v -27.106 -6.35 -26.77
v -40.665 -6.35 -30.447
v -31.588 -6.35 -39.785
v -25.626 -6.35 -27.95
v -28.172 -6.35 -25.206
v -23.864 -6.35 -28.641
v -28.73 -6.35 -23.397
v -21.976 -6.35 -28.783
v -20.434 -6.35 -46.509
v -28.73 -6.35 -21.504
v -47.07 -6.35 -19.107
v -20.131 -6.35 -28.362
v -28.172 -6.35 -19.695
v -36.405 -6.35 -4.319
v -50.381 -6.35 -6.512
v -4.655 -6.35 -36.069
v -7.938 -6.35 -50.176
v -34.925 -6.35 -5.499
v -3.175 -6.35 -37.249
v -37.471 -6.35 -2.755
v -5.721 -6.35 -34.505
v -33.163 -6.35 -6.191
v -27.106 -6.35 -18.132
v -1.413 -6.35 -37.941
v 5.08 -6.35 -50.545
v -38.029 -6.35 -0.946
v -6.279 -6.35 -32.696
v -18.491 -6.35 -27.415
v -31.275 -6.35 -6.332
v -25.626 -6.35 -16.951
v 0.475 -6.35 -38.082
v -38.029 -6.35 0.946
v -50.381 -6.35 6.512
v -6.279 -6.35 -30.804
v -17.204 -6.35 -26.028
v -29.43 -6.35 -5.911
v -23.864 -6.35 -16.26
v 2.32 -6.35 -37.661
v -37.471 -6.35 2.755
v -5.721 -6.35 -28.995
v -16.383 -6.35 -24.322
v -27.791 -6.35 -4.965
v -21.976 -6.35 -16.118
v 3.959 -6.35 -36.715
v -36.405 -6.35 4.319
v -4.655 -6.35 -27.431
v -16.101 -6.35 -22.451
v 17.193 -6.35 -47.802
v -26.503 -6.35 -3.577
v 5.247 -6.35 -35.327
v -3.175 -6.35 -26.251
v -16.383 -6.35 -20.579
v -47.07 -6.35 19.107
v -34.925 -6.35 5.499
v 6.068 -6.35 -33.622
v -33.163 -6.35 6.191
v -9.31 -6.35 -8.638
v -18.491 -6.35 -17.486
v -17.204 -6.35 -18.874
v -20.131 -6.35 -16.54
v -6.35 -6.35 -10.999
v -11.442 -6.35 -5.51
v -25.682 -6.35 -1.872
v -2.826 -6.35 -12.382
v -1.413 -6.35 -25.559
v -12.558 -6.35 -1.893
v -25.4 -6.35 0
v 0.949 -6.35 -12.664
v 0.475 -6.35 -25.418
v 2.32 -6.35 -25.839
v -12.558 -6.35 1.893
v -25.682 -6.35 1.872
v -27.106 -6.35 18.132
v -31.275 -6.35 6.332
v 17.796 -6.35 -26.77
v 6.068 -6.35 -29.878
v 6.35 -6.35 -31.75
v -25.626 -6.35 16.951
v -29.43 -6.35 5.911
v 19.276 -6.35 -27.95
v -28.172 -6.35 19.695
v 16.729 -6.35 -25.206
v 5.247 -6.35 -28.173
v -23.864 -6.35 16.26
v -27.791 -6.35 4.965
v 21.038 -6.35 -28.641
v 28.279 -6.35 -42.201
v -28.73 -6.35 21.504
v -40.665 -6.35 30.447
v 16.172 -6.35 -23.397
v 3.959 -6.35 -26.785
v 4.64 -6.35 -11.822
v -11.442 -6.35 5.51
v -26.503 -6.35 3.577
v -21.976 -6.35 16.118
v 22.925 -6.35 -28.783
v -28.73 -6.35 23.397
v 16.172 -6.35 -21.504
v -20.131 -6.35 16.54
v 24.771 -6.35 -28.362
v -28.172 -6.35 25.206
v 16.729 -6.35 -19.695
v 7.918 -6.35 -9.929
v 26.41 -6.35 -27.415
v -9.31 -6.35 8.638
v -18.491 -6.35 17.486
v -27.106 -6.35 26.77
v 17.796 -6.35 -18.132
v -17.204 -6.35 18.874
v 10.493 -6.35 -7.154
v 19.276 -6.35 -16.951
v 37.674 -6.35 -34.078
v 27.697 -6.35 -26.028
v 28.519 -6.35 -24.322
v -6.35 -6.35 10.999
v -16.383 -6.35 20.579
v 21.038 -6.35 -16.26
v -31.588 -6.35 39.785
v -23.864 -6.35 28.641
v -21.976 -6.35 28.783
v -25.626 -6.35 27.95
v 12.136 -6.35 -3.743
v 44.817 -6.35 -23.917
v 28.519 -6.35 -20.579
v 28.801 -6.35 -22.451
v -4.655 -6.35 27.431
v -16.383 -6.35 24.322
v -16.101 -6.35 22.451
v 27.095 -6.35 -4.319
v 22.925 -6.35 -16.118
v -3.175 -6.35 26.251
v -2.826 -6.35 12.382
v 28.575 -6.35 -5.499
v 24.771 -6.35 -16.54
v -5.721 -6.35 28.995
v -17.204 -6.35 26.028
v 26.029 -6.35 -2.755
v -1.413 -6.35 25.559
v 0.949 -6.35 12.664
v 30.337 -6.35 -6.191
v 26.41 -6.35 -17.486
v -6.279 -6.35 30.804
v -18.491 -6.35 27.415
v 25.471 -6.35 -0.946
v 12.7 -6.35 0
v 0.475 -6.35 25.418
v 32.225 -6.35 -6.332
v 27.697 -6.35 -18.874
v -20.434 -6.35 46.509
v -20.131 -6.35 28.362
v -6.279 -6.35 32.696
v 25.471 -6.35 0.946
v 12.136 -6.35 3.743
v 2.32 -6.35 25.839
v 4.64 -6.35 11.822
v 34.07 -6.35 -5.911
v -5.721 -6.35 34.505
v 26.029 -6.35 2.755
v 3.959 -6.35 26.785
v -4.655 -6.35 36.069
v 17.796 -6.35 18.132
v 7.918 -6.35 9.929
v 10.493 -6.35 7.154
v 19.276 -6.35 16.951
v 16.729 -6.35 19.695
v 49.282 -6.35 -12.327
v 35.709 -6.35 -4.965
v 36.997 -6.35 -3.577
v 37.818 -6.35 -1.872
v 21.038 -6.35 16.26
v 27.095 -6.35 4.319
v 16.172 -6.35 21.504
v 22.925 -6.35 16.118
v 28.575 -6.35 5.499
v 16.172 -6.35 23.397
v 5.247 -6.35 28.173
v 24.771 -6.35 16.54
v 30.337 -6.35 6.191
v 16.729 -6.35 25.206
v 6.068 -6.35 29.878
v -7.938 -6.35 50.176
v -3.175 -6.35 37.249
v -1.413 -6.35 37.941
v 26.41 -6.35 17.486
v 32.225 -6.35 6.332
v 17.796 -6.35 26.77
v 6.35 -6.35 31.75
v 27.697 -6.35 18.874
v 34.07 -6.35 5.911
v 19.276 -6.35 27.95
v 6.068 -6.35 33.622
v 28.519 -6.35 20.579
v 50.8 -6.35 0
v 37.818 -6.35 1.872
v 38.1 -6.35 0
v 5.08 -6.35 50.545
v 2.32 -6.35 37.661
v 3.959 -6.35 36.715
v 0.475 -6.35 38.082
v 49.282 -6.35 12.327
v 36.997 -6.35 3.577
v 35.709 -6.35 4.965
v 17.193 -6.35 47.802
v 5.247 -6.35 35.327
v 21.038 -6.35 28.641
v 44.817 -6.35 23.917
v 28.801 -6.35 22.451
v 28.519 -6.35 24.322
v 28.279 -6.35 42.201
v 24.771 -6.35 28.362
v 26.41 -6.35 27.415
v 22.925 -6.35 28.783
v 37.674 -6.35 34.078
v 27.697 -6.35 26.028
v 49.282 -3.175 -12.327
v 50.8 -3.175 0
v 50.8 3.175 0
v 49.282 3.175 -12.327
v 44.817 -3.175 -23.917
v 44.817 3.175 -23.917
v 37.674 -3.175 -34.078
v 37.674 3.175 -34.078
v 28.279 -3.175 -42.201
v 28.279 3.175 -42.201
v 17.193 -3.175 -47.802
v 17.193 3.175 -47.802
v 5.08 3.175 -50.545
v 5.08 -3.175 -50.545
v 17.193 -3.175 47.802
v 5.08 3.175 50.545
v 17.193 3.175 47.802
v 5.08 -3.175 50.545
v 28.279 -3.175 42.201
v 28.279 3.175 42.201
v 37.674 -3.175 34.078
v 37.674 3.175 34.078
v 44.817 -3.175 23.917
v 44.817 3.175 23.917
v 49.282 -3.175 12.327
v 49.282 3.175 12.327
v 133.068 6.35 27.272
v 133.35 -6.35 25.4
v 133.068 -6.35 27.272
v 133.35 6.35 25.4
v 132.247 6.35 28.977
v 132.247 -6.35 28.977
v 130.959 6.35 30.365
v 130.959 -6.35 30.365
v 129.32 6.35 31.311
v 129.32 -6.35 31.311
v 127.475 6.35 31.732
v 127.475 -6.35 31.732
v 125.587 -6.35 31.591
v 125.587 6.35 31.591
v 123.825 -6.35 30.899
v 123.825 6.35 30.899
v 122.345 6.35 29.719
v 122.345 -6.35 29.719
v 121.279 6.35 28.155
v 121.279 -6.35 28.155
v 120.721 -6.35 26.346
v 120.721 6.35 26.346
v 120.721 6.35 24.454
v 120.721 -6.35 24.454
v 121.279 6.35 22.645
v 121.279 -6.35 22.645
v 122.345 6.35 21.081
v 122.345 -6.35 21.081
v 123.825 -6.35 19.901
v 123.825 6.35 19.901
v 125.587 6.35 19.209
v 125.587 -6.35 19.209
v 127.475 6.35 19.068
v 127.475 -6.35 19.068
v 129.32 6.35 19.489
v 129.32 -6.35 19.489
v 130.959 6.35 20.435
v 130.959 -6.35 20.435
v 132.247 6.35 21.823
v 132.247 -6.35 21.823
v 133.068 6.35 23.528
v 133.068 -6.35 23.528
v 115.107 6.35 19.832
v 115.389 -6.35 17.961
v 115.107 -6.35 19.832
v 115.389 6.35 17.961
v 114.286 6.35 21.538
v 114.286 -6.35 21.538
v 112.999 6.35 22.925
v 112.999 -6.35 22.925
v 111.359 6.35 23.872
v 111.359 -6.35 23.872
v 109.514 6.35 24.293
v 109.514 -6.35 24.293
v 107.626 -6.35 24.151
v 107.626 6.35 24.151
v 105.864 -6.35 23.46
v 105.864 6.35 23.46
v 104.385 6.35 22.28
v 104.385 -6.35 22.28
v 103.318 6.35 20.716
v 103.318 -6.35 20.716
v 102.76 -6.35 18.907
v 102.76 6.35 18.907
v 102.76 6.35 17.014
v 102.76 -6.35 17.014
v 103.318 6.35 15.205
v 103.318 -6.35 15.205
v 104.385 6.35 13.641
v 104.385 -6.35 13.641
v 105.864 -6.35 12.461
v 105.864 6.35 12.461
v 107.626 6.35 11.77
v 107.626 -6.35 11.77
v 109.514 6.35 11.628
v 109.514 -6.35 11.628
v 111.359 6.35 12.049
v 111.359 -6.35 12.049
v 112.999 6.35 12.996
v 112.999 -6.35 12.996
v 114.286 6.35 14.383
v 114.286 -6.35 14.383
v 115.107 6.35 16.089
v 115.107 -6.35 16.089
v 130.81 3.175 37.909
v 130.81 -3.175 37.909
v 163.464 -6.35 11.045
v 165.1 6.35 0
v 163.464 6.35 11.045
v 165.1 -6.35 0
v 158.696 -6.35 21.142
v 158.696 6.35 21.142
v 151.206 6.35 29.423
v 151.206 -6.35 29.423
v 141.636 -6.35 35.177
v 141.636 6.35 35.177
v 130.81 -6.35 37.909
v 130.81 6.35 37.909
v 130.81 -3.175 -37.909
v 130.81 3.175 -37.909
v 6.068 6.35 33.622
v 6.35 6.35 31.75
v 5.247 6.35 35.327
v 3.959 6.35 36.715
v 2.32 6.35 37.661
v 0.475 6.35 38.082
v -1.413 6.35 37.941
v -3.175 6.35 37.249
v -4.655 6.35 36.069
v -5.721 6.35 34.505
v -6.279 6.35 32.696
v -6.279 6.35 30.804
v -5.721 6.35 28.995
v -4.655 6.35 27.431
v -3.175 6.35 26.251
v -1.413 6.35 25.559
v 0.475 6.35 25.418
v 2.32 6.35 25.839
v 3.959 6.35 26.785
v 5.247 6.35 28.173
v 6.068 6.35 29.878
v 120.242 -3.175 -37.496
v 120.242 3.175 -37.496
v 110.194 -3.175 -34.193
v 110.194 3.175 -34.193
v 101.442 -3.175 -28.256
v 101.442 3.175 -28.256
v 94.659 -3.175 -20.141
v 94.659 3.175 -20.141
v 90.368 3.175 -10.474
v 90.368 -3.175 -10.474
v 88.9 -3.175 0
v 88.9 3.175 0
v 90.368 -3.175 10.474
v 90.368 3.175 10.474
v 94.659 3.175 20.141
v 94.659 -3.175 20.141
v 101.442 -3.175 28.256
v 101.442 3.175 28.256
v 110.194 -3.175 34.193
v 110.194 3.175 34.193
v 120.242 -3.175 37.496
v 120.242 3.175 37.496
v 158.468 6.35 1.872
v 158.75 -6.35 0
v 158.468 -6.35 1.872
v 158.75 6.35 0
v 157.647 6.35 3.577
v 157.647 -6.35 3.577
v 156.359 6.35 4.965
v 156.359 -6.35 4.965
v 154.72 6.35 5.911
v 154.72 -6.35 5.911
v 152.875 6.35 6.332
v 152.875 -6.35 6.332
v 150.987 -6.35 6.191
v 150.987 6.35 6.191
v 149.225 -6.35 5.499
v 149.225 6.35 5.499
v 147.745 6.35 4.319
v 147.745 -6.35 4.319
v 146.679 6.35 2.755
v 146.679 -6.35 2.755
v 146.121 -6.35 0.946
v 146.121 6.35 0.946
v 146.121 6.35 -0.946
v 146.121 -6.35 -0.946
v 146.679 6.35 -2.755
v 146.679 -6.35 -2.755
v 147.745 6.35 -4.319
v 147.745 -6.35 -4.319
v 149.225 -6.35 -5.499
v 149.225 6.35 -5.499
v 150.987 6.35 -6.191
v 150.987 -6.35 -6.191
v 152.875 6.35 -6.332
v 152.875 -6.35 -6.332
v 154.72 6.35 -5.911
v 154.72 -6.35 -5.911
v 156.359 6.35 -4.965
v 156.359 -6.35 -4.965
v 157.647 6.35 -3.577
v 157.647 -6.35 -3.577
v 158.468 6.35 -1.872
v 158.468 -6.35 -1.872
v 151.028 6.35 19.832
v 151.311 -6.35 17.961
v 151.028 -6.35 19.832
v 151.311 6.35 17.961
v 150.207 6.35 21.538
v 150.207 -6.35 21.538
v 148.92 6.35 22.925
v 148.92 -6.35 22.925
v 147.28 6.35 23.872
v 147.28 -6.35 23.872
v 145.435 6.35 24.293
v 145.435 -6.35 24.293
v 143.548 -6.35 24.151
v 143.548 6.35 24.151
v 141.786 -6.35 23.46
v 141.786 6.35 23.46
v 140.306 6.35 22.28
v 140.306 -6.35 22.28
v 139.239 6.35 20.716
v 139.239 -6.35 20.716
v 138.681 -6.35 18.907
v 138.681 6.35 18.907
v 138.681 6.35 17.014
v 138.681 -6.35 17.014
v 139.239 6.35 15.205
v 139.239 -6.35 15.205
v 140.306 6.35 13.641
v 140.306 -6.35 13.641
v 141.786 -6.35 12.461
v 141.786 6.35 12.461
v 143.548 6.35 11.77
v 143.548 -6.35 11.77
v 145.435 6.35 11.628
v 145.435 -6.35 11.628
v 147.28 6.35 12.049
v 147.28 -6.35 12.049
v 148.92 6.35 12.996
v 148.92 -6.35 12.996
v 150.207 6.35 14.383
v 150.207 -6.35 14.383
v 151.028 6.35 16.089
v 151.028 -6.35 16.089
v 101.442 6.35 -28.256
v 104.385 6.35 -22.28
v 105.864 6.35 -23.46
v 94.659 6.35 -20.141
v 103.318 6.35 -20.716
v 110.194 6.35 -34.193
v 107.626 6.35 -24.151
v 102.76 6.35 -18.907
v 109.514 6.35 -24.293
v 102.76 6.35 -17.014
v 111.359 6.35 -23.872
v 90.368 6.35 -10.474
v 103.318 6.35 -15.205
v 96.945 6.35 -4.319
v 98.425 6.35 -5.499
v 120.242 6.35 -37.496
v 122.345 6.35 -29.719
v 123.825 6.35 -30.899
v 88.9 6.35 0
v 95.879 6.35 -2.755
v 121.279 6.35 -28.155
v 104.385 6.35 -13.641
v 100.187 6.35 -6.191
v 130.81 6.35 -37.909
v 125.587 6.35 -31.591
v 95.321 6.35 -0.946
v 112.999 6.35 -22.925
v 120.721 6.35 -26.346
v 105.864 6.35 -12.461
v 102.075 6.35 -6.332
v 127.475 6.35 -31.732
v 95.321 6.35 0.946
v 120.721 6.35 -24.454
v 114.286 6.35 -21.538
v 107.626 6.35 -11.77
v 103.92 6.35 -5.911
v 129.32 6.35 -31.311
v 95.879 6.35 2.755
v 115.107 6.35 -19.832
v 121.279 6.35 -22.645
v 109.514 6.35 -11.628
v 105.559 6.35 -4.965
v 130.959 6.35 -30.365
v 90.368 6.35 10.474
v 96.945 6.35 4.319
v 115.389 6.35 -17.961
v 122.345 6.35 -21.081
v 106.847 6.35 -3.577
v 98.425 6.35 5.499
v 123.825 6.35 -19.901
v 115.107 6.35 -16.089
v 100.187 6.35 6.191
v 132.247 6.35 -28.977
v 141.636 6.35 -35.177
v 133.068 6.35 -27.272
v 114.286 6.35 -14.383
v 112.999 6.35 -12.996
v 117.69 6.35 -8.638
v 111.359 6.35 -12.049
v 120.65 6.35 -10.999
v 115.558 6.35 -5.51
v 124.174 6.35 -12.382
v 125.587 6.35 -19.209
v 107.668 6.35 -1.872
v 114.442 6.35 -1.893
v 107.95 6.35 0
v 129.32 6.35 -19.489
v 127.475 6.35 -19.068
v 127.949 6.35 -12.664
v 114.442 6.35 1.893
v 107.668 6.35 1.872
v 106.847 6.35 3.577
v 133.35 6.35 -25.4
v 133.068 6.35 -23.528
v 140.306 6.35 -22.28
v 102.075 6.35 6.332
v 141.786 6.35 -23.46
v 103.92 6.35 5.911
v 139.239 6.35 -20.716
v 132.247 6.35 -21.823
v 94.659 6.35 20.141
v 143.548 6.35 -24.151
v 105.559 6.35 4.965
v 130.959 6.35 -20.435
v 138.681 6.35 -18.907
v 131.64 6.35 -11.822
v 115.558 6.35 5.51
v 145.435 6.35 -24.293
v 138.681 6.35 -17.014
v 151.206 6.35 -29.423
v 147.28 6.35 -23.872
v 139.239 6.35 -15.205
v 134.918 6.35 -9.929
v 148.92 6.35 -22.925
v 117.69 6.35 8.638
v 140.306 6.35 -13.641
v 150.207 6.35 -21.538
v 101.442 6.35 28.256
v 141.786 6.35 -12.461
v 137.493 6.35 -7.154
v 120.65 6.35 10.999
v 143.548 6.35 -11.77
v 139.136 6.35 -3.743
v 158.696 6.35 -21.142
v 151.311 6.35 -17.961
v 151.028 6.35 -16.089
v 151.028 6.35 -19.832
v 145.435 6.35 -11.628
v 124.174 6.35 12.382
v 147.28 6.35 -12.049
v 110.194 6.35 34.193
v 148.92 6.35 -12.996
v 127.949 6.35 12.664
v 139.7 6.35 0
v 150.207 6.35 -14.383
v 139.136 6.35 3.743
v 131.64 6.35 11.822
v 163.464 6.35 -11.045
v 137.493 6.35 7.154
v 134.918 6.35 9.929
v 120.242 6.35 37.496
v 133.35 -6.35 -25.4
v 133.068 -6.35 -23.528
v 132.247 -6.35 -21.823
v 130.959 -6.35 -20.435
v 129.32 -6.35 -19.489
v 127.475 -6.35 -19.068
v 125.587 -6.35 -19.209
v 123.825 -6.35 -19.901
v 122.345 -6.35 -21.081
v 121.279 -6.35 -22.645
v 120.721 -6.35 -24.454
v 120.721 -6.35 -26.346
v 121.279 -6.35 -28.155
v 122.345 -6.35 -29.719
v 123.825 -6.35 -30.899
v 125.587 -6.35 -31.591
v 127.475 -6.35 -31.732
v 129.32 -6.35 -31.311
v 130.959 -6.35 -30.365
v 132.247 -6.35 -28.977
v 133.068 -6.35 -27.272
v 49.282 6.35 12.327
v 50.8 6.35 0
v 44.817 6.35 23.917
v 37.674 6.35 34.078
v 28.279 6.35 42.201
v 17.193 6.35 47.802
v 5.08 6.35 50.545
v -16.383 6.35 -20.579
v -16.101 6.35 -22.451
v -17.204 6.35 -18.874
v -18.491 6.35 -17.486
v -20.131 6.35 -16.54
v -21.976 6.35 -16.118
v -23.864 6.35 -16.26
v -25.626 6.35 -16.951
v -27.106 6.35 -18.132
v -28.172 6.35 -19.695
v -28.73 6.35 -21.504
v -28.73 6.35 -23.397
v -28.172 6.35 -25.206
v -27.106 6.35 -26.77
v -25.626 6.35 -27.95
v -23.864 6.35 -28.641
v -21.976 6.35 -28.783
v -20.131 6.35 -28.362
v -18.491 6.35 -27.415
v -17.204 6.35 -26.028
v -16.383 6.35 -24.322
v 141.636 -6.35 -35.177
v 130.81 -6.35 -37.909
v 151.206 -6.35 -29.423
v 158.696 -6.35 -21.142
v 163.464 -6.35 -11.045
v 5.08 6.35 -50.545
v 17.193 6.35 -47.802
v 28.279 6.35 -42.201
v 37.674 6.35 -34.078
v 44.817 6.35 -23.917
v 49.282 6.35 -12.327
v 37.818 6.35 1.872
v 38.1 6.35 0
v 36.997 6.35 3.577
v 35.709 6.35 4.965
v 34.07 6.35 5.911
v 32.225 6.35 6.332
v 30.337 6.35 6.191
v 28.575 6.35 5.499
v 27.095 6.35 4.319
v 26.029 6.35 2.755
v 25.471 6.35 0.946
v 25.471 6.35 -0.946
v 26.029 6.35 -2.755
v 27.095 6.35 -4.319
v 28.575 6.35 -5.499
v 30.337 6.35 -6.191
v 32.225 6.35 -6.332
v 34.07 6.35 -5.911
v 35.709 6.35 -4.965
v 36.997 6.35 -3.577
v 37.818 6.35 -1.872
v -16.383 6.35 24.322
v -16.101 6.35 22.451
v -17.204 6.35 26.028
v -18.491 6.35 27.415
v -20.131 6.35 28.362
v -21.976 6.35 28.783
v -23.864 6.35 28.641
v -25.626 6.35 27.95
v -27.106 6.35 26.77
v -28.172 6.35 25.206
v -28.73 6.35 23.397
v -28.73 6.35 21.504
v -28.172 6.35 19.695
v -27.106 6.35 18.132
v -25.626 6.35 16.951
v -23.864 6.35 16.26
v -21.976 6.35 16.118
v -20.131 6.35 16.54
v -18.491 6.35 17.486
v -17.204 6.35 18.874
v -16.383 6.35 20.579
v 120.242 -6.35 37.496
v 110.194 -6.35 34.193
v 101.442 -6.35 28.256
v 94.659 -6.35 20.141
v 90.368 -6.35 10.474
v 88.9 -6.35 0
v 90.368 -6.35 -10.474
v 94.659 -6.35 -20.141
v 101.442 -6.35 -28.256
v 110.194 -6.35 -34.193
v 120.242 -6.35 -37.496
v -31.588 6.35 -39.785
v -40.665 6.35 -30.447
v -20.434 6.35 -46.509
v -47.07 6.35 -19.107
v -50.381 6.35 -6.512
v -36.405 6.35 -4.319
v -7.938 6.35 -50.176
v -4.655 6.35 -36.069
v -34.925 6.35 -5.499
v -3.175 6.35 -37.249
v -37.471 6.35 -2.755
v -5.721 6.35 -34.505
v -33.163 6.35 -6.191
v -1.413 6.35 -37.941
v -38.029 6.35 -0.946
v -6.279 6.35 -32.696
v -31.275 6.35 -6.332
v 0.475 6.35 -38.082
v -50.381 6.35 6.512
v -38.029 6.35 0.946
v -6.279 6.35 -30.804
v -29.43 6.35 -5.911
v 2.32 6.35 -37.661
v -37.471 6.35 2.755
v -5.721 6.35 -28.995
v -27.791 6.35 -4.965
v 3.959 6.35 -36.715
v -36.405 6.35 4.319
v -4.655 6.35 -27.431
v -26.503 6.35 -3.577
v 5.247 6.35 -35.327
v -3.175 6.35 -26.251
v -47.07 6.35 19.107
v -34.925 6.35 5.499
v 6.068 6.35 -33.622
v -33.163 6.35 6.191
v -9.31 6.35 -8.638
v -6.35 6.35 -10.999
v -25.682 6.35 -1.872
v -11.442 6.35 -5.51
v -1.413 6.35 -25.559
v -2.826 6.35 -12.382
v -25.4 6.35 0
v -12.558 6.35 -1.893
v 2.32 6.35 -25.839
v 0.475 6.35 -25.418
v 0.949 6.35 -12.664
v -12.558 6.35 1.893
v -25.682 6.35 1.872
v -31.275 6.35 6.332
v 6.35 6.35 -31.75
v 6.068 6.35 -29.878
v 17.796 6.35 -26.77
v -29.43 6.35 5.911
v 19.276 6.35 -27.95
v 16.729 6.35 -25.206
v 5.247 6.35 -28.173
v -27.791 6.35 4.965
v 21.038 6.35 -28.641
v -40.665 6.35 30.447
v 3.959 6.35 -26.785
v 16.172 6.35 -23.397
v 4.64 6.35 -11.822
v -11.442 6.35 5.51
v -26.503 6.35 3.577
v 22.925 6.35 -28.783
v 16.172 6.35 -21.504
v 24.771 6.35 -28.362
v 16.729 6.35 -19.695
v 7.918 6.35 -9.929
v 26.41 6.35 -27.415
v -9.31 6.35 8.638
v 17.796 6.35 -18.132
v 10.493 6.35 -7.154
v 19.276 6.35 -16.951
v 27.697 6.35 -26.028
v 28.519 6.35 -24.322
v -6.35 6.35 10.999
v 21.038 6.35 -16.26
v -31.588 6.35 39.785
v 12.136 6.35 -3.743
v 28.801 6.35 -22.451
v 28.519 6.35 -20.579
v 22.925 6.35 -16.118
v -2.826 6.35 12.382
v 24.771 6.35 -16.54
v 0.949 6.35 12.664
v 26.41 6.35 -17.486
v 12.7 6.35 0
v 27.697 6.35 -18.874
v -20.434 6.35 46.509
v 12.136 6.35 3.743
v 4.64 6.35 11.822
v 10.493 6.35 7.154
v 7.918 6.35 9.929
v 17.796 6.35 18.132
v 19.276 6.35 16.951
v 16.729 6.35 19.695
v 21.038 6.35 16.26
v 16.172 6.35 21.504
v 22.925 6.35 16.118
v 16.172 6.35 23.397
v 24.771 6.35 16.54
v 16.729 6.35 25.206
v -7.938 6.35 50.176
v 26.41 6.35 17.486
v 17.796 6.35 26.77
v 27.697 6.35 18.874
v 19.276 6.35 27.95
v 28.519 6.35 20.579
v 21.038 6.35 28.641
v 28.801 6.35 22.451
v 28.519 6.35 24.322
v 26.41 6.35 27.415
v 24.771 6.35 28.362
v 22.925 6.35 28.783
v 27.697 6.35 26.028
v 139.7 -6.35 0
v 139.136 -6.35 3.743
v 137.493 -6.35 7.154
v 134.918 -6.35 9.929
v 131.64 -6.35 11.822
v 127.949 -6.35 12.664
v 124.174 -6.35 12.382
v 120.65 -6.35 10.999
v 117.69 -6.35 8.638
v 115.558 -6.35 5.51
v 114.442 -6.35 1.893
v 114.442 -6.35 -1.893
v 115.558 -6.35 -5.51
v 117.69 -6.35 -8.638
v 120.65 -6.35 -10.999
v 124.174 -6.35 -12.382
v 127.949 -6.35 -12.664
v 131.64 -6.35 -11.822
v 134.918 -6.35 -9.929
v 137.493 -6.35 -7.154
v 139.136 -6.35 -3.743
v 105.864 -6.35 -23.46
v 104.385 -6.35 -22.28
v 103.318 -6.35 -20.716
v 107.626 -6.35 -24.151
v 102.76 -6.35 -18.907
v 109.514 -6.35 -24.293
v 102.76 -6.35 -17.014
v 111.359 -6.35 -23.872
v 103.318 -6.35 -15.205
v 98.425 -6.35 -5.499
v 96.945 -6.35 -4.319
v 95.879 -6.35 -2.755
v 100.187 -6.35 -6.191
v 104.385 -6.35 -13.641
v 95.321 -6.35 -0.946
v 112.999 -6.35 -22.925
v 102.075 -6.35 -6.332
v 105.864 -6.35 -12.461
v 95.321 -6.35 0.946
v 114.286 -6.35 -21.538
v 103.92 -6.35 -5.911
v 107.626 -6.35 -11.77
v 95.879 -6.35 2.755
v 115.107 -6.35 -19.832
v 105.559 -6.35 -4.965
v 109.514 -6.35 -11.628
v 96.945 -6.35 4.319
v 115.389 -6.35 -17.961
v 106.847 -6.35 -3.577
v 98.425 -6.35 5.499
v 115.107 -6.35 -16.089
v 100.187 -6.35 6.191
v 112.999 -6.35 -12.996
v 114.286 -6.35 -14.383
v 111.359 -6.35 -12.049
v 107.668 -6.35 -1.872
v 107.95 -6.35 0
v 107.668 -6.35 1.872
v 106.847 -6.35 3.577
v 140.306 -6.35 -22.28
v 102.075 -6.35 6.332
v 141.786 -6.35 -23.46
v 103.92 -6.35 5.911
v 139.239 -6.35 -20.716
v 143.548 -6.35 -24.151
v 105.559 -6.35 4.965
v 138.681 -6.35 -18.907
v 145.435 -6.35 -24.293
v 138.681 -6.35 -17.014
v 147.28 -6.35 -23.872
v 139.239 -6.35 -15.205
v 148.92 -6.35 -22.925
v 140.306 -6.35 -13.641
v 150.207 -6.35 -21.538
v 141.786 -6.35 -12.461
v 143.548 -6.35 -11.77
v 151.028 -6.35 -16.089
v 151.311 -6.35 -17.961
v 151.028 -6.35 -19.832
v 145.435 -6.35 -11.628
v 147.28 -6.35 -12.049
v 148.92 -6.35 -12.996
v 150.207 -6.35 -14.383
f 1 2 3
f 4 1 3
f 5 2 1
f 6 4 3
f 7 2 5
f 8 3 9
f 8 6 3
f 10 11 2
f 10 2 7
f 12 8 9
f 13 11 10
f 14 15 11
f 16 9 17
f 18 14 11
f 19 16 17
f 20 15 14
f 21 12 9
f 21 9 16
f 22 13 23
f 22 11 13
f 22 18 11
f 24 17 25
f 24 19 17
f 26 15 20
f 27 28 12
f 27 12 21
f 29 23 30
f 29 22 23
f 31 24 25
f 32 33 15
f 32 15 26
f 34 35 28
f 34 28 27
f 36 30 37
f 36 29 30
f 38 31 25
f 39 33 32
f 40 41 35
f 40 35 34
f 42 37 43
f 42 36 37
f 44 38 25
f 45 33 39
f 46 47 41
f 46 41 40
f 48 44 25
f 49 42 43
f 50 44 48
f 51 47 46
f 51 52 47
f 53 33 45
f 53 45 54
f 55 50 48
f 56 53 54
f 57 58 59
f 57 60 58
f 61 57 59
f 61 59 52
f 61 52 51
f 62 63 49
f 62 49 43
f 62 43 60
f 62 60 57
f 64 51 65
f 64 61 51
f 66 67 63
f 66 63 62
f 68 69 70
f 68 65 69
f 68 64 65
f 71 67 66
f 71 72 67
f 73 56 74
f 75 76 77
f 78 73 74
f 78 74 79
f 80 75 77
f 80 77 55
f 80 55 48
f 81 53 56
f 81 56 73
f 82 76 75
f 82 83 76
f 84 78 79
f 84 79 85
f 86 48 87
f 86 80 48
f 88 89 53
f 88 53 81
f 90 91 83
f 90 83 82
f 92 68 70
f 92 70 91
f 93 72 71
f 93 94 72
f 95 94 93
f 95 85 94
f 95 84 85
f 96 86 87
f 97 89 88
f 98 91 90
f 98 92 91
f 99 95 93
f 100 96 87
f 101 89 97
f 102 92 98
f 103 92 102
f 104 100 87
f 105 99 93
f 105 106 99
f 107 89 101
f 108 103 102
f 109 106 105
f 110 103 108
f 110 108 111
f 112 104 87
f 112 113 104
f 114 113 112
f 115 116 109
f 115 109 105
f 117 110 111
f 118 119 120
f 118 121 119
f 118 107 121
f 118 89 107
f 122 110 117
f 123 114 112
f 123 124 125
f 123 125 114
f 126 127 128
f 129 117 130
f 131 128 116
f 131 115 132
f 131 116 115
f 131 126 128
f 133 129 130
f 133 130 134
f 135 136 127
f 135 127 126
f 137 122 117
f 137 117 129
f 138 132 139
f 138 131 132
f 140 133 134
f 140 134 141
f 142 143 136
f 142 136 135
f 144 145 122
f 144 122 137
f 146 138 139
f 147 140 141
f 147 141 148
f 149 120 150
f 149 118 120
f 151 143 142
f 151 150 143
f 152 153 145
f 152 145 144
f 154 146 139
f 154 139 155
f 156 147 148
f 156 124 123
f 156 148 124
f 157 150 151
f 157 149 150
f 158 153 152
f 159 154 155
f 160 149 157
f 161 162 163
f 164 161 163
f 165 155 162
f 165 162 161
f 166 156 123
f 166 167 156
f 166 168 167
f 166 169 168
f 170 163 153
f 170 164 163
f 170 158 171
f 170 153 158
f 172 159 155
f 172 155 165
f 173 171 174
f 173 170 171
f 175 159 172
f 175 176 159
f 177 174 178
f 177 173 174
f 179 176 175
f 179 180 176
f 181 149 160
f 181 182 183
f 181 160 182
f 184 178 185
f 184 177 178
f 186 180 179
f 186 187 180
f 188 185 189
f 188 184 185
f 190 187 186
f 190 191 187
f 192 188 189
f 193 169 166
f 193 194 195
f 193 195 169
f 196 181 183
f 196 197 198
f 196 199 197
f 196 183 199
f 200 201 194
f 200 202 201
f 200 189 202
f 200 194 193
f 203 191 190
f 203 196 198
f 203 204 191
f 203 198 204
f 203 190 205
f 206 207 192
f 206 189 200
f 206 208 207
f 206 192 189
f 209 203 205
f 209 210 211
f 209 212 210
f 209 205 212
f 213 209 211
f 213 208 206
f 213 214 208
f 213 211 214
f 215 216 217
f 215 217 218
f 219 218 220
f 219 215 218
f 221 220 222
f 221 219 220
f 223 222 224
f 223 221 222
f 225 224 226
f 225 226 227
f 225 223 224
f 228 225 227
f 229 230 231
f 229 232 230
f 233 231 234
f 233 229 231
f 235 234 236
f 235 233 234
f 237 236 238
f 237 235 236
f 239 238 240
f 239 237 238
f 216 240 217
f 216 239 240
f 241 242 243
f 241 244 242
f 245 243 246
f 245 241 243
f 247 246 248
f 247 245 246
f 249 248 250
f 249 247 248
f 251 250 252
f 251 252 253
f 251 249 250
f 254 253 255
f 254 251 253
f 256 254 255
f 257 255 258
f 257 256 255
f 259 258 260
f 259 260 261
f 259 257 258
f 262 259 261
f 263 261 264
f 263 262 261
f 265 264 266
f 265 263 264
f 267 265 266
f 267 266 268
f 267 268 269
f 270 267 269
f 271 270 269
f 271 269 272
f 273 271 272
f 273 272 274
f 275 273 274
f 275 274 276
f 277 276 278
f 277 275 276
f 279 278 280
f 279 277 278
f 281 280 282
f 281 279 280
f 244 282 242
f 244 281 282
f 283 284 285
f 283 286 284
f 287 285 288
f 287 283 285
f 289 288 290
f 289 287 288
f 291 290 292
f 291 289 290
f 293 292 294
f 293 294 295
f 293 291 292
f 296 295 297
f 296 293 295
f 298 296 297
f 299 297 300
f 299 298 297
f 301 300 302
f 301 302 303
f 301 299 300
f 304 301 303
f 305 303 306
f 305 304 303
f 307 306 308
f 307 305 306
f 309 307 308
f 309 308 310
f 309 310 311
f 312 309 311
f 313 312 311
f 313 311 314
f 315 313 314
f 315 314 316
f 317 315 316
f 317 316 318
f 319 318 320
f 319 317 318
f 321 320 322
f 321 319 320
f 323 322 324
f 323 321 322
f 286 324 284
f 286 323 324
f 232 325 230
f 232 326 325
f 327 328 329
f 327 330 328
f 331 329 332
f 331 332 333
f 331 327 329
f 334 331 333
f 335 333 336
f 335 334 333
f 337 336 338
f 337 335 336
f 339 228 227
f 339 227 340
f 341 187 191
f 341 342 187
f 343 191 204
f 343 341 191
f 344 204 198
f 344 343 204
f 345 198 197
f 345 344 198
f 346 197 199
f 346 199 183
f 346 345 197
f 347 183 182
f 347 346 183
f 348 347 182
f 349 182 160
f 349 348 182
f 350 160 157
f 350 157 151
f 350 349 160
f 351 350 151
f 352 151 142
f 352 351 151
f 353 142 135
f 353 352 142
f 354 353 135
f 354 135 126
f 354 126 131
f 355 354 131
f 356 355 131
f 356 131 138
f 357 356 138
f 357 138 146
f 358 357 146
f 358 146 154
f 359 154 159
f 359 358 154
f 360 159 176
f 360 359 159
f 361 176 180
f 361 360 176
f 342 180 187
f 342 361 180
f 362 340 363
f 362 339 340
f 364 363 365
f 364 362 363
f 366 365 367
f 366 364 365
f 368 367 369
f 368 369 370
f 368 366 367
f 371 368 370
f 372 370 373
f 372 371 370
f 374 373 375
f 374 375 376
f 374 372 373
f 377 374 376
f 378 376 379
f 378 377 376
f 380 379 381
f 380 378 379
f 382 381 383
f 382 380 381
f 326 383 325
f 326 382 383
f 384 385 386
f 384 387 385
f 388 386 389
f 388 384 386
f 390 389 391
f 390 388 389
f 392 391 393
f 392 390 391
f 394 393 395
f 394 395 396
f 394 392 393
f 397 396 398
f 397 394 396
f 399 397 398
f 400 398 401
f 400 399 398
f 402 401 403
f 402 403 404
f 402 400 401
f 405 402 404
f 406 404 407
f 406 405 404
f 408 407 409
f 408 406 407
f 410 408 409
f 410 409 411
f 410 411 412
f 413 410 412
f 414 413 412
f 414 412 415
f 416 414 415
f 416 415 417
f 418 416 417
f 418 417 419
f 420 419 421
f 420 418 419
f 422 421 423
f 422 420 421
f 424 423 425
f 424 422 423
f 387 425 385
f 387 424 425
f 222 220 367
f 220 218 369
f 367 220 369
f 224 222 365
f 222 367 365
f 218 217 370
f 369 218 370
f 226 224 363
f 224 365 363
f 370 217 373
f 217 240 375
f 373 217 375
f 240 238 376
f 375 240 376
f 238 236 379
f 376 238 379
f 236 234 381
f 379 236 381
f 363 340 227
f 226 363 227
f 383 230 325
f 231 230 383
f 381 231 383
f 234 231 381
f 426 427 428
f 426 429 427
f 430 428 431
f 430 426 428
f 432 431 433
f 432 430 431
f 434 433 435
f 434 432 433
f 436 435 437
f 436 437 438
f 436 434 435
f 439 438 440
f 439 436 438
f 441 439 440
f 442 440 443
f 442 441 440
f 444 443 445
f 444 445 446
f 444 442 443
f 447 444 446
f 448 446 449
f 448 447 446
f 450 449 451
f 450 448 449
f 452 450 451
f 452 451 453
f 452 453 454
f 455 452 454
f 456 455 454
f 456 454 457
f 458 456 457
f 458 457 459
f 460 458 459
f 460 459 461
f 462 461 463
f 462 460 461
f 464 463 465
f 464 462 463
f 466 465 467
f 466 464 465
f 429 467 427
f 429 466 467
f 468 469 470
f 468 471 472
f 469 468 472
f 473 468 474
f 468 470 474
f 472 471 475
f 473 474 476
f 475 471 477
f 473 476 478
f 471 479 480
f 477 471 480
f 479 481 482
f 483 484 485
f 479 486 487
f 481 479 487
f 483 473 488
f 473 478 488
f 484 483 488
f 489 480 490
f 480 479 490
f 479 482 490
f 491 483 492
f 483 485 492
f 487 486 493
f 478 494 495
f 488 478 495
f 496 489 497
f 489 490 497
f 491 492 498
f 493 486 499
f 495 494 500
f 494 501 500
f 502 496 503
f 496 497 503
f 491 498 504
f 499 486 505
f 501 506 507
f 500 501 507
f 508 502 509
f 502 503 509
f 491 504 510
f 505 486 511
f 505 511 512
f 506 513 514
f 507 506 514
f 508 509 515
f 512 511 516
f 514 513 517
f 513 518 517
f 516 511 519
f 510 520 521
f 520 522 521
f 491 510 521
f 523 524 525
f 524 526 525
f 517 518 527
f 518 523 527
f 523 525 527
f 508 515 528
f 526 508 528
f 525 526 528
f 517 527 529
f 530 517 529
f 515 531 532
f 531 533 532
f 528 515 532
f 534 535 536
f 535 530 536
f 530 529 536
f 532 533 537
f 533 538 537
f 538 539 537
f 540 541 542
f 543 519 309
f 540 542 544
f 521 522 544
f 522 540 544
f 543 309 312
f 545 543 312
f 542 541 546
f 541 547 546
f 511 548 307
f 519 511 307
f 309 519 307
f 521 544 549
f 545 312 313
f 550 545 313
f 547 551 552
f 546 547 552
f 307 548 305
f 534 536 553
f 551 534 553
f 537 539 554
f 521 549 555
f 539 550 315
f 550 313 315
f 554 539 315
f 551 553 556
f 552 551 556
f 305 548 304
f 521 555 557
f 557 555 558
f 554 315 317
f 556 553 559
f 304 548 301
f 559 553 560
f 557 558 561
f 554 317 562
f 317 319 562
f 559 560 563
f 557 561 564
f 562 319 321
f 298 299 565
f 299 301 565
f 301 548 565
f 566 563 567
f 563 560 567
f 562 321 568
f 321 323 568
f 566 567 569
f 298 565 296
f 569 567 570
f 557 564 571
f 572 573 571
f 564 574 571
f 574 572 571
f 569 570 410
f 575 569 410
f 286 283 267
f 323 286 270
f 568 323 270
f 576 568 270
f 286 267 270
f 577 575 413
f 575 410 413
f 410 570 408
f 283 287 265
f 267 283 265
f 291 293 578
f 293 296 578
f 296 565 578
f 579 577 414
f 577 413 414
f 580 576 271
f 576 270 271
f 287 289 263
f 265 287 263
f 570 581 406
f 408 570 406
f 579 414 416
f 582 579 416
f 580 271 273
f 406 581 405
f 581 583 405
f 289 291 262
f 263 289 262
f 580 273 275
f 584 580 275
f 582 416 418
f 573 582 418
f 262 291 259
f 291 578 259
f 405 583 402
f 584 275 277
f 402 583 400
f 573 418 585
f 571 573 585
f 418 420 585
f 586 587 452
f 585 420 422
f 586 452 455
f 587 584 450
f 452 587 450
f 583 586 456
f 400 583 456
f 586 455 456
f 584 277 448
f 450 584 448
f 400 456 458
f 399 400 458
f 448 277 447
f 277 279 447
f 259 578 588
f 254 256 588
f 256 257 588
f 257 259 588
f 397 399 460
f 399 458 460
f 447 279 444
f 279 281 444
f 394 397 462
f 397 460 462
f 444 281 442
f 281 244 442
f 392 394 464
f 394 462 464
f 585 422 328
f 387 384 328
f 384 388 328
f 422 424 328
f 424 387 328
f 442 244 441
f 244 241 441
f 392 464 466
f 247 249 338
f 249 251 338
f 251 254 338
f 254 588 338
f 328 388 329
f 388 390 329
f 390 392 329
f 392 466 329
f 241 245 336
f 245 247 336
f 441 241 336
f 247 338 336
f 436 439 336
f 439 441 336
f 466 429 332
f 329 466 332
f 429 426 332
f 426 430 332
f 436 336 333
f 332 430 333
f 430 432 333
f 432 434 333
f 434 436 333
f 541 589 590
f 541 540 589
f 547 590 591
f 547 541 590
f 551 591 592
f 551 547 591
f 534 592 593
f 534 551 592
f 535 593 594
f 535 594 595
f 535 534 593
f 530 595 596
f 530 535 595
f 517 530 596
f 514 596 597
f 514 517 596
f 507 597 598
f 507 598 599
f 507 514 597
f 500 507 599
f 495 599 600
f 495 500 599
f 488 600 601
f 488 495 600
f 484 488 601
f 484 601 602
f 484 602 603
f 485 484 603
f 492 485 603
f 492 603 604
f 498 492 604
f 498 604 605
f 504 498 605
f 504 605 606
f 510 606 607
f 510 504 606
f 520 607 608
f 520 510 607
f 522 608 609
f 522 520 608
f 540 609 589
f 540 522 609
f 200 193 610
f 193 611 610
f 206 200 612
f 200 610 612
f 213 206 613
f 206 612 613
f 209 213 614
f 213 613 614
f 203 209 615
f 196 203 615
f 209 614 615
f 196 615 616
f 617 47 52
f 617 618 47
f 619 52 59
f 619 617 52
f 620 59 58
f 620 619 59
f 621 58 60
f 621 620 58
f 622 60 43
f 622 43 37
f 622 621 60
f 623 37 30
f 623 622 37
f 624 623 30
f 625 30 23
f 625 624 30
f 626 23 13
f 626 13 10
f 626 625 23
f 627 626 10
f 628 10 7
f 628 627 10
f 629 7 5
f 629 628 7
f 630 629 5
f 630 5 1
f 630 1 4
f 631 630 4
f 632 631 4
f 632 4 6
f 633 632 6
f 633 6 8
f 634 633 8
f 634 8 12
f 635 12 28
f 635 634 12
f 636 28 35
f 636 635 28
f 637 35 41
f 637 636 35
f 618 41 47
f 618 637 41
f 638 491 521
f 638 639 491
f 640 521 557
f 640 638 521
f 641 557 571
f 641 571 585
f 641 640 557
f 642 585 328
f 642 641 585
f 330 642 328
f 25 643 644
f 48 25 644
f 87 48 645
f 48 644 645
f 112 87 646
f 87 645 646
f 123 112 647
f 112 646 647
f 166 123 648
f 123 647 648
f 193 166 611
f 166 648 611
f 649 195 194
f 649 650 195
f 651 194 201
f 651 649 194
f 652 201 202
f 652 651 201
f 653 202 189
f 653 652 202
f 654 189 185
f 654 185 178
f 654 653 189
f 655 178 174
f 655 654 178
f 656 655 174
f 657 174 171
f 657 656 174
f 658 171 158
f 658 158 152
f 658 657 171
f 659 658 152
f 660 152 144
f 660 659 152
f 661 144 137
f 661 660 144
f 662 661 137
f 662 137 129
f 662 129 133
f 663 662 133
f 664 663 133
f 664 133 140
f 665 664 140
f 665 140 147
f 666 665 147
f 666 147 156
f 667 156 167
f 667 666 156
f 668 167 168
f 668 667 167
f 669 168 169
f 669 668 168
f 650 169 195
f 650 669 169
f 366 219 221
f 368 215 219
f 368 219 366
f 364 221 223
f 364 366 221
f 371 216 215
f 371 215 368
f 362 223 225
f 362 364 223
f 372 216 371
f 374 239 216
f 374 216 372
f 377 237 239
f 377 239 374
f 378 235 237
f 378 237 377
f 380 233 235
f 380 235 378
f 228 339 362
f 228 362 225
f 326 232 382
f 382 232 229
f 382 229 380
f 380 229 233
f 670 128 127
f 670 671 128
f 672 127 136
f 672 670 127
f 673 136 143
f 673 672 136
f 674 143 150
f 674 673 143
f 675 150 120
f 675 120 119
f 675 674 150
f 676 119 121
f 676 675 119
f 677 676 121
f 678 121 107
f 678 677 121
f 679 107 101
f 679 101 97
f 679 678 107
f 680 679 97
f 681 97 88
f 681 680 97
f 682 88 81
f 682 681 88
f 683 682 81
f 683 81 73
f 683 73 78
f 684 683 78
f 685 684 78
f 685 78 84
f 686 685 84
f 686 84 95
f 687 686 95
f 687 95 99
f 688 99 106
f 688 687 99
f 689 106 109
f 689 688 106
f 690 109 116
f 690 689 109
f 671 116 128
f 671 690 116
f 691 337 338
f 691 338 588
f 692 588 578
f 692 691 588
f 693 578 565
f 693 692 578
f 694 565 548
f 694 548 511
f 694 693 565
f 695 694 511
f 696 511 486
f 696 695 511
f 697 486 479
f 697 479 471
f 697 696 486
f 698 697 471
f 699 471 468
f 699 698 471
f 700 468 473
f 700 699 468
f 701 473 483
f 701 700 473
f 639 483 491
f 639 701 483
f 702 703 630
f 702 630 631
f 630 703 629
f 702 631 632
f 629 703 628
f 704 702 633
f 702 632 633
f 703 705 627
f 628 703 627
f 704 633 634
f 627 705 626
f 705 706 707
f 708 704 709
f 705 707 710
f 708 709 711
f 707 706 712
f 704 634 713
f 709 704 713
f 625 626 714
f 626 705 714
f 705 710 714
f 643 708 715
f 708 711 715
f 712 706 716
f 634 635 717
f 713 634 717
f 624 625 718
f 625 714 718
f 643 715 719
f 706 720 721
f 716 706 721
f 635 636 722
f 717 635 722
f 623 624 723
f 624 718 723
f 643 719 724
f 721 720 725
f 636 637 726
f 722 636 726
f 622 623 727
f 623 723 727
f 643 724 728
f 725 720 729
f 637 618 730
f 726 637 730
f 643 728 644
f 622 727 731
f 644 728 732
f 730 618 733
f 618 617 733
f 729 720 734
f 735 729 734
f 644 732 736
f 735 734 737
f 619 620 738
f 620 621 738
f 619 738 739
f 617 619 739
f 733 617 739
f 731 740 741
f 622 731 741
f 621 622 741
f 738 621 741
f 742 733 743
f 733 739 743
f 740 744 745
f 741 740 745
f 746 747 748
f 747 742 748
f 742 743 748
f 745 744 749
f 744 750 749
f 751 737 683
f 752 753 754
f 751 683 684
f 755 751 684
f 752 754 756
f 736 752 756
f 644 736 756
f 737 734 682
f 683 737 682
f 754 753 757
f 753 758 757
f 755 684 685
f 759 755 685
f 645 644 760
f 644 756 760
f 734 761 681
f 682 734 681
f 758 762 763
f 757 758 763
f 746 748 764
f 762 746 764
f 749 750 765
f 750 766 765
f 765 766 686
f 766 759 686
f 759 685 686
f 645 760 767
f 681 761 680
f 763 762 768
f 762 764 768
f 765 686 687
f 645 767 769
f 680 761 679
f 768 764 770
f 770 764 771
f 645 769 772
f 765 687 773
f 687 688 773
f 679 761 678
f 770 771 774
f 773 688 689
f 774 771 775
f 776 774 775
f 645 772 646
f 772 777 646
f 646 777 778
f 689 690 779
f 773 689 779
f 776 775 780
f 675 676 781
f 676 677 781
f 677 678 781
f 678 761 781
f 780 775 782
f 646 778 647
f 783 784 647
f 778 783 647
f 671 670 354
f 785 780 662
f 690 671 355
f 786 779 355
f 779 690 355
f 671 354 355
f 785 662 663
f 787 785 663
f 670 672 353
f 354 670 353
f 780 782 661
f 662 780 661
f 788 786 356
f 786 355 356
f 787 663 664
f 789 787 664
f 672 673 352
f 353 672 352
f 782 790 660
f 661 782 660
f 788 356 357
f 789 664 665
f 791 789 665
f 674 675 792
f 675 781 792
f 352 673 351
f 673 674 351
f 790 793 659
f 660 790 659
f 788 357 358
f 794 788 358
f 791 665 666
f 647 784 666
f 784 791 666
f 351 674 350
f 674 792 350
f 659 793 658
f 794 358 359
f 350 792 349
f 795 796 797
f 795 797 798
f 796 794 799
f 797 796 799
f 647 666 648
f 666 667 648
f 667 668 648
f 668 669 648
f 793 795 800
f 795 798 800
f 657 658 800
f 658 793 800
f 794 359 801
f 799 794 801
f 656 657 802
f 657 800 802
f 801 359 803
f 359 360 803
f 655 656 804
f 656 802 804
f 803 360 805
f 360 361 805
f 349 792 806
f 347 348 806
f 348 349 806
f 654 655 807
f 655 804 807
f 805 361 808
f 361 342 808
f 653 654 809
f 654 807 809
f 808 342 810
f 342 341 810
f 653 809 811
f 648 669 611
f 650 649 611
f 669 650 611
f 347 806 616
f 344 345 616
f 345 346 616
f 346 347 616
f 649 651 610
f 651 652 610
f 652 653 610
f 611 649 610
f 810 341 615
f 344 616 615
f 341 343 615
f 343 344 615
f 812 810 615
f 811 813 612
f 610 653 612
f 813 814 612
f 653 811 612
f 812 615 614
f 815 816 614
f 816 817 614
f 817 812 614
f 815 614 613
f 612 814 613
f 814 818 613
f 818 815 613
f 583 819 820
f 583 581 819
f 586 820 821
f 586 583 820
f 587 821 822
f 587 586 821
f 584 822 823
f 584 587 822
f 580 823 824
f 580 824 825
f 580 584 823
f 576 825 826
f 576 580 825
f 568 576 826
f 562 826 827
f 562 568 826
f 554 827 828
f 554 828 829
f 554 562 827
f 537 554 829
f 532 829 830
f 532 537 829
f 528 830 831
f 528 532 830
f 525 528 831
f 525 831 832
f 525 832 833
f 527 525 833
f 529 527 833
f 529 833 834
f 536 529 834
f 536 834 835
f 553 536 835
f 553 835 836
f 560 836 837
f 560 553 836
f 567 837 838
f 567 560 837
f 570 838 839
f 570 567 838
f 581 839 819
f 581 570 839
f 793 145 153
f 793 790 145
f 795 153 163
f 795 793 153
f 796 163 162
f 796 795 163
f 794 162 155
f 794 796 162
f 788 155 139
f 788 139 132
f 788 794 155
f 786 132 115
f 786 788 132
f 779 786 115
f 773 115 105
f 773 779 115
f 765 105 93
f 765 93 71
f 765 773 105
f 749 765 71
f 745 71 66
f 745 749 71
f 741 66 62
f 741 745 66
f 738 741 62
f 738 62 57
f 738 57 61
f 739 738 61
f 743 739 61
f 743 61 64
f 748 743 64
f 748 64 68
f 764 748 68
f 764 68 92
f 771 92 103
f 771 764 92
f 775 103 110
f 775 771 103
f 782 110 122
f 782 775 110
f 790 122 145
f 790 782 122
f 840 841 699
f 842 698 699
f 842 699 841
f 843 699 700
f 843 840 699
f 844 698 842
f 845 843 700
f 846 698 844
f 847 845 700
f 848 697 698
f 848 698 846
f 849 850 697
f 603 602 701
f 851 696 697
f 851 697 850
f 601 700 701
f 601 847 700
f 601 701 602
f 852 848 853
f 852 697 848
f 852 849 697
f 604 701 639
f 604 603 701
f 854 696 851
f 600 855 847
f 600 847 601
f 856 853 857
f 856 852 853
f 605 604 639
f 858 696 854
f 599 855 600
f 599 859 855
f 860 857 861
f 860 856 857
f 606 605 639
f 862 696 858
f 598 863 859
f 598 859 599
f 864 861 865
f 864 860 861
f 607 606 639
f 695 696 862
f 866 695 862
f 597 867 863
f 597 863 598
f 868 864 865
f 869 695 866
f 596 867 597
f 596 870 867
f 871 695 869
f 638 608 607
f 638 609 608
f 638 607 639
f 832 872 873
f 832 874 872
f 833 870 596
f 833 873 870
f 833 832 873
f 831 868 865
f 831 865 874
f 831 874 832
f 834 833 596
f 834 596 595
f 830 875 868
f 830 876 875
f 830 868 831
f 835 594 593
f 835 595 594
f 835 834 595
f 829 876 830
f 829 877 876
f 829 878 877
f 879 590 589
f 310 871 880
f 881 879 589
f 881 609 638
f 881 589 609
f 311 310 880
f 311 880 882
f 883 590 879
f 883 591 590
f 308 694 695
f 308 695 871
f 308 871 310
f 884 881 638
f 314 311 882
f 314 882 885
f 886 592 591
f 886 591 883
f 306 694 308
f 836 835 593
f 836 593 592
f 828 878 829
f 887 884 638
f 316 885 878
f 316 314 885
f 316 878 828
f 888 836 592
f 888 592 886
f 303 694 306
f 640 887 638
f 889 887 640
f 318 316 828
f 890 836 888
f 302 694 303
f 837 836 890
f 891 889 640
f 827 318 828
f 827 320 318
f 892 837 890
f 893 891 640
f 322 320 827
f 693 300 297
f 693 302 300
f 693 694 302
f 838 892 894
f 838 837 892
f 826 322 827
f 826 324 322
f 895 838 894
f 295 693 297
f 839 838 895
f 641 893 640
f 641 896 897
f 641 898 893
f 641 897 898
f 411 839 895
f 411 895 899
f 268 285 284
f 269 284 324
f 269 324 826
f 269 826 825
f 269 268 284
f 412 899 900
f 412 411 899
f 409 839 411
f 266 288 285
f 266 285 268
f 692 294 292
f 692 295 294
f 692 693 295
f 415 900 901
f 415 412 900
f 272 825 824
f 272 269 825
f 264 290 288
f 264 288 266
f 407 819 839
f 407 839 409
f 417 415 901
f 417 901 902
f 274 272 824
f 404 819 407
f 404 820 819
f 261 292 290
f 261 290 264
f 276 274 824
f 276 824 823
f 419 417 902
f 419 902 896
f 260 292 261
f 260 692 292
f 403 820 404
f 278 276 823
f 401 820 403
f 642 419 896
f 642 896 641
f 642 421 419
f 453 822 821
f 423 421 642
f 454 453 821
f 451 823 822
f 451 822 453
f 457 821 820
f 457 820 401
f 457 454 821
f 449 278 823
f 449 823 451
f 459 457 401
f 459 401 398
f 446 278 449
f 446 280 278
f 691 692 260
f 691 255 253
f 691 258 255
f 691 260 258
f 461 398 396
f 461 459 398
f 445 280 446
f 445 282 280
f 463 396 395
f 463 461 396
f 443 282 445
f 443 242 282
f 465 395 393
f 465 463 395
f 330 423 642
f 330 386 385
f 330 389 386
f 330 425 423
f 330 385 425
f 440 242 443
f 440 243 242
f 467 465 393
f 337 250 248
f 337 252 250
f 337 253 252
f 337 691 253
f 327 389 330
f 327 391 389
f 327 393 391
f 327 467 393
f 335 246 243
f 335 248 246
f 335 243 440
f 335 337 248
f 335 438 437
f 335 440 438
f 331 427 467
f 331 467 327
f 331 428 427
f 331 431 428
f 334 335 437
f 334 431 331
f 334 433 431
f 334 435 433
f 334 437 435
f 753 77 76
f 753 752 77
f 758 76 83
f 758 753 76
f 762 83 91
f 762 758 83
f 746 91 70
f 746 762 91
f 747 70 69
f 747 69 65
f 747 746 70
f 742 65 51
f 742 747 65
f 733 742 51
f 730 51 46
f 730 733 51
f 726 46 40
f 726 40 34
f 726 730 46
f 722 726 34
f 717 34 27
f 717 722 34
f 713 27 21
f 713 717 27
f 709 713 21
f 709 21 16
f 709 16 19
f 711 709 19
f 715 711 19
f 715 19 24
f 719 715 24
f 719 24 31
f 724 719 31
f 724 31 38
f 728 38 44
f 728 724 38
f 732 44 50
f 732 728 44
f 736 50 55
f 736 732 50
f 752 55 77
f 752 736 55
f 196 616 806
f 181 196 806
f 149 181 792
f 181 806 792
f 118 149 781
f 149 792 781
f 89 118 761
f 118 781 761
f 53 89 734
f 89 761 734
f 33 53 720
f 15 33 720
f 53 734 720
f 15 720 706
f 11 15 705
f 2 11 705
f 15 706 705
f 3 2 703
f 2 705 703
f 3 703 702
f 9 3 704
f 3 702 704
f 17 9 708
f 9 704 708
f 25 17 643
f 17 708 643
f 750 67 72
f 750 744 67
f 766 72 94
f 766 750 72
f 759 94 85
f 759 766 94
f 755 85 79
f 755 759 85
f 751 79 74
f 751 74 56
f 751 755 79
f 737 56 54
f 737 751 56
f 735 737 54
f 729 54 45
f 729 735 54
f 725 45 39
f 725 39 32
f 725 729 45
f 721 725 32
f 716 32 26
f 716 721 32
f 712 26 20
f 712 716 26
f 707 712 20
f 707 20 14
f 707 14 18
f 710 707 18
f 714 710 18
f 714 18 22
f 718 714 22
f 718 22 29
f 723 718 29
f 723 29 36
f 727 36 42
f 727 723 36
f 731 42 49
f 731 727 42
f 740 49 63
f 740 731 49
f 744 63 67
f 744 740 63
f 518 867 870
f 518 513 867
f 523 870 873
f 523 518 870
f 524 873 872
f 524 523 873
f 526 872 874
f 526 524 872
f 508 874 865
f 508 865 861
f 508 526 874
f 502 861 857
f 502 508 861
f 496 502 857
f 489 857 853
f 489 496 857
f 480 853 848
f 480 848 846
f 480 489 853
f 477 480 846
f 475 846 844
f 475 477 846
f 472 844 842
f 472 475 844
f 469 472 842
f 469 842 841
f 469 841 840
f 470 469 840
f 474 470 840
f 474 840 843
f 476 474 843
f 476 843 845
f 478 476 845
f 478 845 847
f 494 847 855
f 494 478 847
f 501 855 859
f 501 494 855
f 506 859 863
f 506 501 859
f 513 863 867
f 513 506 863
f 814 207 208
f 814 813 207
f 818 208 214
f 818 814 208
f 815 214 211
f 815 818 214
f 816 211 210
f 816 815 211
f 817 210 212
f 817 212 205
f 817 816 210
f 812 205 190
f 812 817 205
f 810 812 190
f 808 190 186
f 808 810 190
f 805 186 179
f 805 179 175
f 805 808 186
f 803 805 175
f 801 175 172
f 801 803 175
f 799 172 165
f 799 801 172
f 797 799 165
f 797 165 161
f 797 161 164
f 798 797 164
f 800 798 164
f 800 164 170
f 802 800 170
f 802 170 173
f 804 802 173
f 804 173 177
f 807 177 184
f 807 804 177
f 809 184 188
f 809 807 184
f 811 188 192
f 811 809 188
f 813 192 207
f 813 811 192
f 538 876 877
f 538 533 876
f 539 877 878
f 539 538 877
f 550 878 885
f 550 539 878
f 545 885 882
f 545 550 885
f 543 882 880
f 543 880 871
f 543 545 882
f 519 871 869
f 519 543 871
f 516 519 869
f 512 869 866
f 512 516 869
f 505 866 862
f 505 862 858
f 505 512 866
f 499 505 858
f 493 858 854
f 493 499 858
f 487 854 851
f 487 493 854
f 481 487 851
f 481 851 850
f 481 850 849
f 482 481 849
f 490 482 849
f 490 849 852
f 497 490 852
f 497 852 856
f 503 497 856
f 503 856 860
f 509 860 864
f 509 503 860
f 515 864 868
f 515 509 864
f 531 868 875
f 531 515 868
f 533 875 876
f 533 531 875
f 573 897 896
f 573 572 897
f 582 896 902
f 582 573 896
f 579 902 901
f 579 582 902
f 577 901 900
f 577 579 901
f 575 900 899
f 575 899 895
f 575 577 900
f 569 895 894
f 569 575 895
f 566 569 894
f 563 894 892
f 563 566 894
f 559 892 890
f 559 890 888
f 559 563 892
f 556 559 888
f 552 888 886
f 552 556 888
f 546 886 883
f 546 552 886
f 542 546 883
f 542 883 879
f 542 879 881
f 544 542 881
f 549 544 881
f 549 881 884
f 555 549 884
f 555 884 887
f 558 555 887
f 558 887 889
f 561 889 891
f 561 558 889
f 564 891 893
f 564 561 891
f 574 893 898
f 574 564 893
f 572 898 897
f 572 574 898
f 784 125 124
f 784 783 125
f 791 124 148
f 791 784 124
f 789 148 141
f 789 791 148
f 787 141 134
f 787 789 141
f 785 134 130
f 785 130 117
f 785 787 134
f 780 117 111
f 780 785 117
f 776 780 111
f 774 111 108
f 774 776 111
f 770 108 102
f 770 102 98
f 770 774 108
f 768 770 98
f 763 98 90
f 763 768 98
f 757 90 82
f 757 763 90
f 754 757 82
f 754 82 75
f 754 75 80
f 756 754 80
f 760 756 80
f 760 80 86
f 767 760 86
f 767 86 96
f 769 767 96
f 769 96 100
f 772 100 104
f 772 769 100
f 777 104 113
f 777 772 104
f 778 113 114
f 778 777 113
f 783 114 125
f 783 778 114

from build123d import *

# Parameters (mm, degrees)
F0_R     = 6.35
F0_R_2   = 12.7
F1_DEPTH = 6.35
F2_DEPTH = 3.175


with BuildPart() as f1:
    # F0 (on Front) → F1 (new body, symmetric)
    with BuildSketch(Plane.XZ):
        with BuildLine():
            ThreePointArc((5.08, -50.545362), (37.674288, -34.077676), (50.8, 0))
            ThreePointArc((50.8, 0), (37.674288, 34.077676), (5.08, 50.545362))
            ThreePointArc((5.08, 50.545362), (-50.8, 0), (5.08, -50.545362))
        make_face()
        with Locations((0, -31.75)):
            Circle(F0_R, mode=Mode.SUBTRACT)
        with Locations((-22.45064, -22.45064)):
            Circle(F0_R, mode=Mode.SUBTRACT)
        with Locations((-31.75, 0)):
            Circle(F0_R, mode=Mode.SUBTRACT)
        Circle(F0_R_2, mode=Mode.SUBTRACT)
        with Locations((22.45064, -22.45064)):
            Circle(F0_R, mode=Mode.SUBTRACT)
        with Locations((31.75, 0)):
            Circle(F0_R, mode=Mode.SUBTRACT)
        with Locations((-22.45064, 22.45064)):
            Circle(F0_R, mode=Mode.SUBTRACT)
        with Locations((22.45064, 22.45064)):
            Circle(F0_R, mode=Mode.SUBTRACT)
        with Locations((0, 31.75)):
            Circle(F0_R, mode=Mode.SUBTRACT)
        with BuildLine():
            ThreePointArc((165.1, 0), (155.255716, 25.558257), (130.81, 37.909021))
            ThreePointArc((130.81, 37.909021), (88.9, 0), (130.81, -37.909021))
            ThreePointArc((130.81, -37.909021), (155.255716, -25.558257), (165.1, 0))
        make_face()
        with Locations((127, -25.4)):
            Circle(F0_R, mode=Mode.SUBTRACT)
        with Locations((109.039488, -17.960512)):
            Circle(F0_R, mode=Mode.SUBTRACT)
        with Locations((101.6, 0)):
            Circle(F0_R, mode=Mode.SUBTRACT)
        with Locations((144.960512, -17.960512)):
            Circle(F0_R, mode=Mode.SUBTRACT)
        with Locations((127, 0)):
            Circle(F0_R_2, mode=Mode.SUBTRACT)
        with Locations((152.4, 0)):
            Circle(F0_R, mode=Mode.SUBTRACT)
        with Locations((109.039488, 17.960512)):
            Circle(F0_R, mode=Mode.SUBTRACT)
        with Locations((127, 25.4)):
            Circle(F0_R, mode=Mode.SUBTRACT)
        with Locations((144.960512, 17.960512)):
            Circle(F0_R, mode=Mode.SUBTRACT)
    extrude(amount=F1_DEPTH, both=True)


with BuildPart() as f2:
    # F0 (on Front) → F2 (new body, symmetric)
    with BuildSketch(Plane.XZ):
        with BuildLine():
            ThreePointArc((5.08, 50.545362), (37.674288, 34.077676), (50.8, 0))
            ThreePointArc((50.8, 0), (37.674288, -34.077676), (5.08, -50.545362))
            Line((5.08, -50.545362), (130.81, -37.909021))
            ThreePointArc((130.81, -37.909021), (88.9, 0), (130.81, 37.909021))
            Line((130.81, 37.909021), (5.08, 50.545362))
        make_face()
    extrude(amount=F2_DEPTH, both=True)


solid = Compound([f1.part, f2.part])
